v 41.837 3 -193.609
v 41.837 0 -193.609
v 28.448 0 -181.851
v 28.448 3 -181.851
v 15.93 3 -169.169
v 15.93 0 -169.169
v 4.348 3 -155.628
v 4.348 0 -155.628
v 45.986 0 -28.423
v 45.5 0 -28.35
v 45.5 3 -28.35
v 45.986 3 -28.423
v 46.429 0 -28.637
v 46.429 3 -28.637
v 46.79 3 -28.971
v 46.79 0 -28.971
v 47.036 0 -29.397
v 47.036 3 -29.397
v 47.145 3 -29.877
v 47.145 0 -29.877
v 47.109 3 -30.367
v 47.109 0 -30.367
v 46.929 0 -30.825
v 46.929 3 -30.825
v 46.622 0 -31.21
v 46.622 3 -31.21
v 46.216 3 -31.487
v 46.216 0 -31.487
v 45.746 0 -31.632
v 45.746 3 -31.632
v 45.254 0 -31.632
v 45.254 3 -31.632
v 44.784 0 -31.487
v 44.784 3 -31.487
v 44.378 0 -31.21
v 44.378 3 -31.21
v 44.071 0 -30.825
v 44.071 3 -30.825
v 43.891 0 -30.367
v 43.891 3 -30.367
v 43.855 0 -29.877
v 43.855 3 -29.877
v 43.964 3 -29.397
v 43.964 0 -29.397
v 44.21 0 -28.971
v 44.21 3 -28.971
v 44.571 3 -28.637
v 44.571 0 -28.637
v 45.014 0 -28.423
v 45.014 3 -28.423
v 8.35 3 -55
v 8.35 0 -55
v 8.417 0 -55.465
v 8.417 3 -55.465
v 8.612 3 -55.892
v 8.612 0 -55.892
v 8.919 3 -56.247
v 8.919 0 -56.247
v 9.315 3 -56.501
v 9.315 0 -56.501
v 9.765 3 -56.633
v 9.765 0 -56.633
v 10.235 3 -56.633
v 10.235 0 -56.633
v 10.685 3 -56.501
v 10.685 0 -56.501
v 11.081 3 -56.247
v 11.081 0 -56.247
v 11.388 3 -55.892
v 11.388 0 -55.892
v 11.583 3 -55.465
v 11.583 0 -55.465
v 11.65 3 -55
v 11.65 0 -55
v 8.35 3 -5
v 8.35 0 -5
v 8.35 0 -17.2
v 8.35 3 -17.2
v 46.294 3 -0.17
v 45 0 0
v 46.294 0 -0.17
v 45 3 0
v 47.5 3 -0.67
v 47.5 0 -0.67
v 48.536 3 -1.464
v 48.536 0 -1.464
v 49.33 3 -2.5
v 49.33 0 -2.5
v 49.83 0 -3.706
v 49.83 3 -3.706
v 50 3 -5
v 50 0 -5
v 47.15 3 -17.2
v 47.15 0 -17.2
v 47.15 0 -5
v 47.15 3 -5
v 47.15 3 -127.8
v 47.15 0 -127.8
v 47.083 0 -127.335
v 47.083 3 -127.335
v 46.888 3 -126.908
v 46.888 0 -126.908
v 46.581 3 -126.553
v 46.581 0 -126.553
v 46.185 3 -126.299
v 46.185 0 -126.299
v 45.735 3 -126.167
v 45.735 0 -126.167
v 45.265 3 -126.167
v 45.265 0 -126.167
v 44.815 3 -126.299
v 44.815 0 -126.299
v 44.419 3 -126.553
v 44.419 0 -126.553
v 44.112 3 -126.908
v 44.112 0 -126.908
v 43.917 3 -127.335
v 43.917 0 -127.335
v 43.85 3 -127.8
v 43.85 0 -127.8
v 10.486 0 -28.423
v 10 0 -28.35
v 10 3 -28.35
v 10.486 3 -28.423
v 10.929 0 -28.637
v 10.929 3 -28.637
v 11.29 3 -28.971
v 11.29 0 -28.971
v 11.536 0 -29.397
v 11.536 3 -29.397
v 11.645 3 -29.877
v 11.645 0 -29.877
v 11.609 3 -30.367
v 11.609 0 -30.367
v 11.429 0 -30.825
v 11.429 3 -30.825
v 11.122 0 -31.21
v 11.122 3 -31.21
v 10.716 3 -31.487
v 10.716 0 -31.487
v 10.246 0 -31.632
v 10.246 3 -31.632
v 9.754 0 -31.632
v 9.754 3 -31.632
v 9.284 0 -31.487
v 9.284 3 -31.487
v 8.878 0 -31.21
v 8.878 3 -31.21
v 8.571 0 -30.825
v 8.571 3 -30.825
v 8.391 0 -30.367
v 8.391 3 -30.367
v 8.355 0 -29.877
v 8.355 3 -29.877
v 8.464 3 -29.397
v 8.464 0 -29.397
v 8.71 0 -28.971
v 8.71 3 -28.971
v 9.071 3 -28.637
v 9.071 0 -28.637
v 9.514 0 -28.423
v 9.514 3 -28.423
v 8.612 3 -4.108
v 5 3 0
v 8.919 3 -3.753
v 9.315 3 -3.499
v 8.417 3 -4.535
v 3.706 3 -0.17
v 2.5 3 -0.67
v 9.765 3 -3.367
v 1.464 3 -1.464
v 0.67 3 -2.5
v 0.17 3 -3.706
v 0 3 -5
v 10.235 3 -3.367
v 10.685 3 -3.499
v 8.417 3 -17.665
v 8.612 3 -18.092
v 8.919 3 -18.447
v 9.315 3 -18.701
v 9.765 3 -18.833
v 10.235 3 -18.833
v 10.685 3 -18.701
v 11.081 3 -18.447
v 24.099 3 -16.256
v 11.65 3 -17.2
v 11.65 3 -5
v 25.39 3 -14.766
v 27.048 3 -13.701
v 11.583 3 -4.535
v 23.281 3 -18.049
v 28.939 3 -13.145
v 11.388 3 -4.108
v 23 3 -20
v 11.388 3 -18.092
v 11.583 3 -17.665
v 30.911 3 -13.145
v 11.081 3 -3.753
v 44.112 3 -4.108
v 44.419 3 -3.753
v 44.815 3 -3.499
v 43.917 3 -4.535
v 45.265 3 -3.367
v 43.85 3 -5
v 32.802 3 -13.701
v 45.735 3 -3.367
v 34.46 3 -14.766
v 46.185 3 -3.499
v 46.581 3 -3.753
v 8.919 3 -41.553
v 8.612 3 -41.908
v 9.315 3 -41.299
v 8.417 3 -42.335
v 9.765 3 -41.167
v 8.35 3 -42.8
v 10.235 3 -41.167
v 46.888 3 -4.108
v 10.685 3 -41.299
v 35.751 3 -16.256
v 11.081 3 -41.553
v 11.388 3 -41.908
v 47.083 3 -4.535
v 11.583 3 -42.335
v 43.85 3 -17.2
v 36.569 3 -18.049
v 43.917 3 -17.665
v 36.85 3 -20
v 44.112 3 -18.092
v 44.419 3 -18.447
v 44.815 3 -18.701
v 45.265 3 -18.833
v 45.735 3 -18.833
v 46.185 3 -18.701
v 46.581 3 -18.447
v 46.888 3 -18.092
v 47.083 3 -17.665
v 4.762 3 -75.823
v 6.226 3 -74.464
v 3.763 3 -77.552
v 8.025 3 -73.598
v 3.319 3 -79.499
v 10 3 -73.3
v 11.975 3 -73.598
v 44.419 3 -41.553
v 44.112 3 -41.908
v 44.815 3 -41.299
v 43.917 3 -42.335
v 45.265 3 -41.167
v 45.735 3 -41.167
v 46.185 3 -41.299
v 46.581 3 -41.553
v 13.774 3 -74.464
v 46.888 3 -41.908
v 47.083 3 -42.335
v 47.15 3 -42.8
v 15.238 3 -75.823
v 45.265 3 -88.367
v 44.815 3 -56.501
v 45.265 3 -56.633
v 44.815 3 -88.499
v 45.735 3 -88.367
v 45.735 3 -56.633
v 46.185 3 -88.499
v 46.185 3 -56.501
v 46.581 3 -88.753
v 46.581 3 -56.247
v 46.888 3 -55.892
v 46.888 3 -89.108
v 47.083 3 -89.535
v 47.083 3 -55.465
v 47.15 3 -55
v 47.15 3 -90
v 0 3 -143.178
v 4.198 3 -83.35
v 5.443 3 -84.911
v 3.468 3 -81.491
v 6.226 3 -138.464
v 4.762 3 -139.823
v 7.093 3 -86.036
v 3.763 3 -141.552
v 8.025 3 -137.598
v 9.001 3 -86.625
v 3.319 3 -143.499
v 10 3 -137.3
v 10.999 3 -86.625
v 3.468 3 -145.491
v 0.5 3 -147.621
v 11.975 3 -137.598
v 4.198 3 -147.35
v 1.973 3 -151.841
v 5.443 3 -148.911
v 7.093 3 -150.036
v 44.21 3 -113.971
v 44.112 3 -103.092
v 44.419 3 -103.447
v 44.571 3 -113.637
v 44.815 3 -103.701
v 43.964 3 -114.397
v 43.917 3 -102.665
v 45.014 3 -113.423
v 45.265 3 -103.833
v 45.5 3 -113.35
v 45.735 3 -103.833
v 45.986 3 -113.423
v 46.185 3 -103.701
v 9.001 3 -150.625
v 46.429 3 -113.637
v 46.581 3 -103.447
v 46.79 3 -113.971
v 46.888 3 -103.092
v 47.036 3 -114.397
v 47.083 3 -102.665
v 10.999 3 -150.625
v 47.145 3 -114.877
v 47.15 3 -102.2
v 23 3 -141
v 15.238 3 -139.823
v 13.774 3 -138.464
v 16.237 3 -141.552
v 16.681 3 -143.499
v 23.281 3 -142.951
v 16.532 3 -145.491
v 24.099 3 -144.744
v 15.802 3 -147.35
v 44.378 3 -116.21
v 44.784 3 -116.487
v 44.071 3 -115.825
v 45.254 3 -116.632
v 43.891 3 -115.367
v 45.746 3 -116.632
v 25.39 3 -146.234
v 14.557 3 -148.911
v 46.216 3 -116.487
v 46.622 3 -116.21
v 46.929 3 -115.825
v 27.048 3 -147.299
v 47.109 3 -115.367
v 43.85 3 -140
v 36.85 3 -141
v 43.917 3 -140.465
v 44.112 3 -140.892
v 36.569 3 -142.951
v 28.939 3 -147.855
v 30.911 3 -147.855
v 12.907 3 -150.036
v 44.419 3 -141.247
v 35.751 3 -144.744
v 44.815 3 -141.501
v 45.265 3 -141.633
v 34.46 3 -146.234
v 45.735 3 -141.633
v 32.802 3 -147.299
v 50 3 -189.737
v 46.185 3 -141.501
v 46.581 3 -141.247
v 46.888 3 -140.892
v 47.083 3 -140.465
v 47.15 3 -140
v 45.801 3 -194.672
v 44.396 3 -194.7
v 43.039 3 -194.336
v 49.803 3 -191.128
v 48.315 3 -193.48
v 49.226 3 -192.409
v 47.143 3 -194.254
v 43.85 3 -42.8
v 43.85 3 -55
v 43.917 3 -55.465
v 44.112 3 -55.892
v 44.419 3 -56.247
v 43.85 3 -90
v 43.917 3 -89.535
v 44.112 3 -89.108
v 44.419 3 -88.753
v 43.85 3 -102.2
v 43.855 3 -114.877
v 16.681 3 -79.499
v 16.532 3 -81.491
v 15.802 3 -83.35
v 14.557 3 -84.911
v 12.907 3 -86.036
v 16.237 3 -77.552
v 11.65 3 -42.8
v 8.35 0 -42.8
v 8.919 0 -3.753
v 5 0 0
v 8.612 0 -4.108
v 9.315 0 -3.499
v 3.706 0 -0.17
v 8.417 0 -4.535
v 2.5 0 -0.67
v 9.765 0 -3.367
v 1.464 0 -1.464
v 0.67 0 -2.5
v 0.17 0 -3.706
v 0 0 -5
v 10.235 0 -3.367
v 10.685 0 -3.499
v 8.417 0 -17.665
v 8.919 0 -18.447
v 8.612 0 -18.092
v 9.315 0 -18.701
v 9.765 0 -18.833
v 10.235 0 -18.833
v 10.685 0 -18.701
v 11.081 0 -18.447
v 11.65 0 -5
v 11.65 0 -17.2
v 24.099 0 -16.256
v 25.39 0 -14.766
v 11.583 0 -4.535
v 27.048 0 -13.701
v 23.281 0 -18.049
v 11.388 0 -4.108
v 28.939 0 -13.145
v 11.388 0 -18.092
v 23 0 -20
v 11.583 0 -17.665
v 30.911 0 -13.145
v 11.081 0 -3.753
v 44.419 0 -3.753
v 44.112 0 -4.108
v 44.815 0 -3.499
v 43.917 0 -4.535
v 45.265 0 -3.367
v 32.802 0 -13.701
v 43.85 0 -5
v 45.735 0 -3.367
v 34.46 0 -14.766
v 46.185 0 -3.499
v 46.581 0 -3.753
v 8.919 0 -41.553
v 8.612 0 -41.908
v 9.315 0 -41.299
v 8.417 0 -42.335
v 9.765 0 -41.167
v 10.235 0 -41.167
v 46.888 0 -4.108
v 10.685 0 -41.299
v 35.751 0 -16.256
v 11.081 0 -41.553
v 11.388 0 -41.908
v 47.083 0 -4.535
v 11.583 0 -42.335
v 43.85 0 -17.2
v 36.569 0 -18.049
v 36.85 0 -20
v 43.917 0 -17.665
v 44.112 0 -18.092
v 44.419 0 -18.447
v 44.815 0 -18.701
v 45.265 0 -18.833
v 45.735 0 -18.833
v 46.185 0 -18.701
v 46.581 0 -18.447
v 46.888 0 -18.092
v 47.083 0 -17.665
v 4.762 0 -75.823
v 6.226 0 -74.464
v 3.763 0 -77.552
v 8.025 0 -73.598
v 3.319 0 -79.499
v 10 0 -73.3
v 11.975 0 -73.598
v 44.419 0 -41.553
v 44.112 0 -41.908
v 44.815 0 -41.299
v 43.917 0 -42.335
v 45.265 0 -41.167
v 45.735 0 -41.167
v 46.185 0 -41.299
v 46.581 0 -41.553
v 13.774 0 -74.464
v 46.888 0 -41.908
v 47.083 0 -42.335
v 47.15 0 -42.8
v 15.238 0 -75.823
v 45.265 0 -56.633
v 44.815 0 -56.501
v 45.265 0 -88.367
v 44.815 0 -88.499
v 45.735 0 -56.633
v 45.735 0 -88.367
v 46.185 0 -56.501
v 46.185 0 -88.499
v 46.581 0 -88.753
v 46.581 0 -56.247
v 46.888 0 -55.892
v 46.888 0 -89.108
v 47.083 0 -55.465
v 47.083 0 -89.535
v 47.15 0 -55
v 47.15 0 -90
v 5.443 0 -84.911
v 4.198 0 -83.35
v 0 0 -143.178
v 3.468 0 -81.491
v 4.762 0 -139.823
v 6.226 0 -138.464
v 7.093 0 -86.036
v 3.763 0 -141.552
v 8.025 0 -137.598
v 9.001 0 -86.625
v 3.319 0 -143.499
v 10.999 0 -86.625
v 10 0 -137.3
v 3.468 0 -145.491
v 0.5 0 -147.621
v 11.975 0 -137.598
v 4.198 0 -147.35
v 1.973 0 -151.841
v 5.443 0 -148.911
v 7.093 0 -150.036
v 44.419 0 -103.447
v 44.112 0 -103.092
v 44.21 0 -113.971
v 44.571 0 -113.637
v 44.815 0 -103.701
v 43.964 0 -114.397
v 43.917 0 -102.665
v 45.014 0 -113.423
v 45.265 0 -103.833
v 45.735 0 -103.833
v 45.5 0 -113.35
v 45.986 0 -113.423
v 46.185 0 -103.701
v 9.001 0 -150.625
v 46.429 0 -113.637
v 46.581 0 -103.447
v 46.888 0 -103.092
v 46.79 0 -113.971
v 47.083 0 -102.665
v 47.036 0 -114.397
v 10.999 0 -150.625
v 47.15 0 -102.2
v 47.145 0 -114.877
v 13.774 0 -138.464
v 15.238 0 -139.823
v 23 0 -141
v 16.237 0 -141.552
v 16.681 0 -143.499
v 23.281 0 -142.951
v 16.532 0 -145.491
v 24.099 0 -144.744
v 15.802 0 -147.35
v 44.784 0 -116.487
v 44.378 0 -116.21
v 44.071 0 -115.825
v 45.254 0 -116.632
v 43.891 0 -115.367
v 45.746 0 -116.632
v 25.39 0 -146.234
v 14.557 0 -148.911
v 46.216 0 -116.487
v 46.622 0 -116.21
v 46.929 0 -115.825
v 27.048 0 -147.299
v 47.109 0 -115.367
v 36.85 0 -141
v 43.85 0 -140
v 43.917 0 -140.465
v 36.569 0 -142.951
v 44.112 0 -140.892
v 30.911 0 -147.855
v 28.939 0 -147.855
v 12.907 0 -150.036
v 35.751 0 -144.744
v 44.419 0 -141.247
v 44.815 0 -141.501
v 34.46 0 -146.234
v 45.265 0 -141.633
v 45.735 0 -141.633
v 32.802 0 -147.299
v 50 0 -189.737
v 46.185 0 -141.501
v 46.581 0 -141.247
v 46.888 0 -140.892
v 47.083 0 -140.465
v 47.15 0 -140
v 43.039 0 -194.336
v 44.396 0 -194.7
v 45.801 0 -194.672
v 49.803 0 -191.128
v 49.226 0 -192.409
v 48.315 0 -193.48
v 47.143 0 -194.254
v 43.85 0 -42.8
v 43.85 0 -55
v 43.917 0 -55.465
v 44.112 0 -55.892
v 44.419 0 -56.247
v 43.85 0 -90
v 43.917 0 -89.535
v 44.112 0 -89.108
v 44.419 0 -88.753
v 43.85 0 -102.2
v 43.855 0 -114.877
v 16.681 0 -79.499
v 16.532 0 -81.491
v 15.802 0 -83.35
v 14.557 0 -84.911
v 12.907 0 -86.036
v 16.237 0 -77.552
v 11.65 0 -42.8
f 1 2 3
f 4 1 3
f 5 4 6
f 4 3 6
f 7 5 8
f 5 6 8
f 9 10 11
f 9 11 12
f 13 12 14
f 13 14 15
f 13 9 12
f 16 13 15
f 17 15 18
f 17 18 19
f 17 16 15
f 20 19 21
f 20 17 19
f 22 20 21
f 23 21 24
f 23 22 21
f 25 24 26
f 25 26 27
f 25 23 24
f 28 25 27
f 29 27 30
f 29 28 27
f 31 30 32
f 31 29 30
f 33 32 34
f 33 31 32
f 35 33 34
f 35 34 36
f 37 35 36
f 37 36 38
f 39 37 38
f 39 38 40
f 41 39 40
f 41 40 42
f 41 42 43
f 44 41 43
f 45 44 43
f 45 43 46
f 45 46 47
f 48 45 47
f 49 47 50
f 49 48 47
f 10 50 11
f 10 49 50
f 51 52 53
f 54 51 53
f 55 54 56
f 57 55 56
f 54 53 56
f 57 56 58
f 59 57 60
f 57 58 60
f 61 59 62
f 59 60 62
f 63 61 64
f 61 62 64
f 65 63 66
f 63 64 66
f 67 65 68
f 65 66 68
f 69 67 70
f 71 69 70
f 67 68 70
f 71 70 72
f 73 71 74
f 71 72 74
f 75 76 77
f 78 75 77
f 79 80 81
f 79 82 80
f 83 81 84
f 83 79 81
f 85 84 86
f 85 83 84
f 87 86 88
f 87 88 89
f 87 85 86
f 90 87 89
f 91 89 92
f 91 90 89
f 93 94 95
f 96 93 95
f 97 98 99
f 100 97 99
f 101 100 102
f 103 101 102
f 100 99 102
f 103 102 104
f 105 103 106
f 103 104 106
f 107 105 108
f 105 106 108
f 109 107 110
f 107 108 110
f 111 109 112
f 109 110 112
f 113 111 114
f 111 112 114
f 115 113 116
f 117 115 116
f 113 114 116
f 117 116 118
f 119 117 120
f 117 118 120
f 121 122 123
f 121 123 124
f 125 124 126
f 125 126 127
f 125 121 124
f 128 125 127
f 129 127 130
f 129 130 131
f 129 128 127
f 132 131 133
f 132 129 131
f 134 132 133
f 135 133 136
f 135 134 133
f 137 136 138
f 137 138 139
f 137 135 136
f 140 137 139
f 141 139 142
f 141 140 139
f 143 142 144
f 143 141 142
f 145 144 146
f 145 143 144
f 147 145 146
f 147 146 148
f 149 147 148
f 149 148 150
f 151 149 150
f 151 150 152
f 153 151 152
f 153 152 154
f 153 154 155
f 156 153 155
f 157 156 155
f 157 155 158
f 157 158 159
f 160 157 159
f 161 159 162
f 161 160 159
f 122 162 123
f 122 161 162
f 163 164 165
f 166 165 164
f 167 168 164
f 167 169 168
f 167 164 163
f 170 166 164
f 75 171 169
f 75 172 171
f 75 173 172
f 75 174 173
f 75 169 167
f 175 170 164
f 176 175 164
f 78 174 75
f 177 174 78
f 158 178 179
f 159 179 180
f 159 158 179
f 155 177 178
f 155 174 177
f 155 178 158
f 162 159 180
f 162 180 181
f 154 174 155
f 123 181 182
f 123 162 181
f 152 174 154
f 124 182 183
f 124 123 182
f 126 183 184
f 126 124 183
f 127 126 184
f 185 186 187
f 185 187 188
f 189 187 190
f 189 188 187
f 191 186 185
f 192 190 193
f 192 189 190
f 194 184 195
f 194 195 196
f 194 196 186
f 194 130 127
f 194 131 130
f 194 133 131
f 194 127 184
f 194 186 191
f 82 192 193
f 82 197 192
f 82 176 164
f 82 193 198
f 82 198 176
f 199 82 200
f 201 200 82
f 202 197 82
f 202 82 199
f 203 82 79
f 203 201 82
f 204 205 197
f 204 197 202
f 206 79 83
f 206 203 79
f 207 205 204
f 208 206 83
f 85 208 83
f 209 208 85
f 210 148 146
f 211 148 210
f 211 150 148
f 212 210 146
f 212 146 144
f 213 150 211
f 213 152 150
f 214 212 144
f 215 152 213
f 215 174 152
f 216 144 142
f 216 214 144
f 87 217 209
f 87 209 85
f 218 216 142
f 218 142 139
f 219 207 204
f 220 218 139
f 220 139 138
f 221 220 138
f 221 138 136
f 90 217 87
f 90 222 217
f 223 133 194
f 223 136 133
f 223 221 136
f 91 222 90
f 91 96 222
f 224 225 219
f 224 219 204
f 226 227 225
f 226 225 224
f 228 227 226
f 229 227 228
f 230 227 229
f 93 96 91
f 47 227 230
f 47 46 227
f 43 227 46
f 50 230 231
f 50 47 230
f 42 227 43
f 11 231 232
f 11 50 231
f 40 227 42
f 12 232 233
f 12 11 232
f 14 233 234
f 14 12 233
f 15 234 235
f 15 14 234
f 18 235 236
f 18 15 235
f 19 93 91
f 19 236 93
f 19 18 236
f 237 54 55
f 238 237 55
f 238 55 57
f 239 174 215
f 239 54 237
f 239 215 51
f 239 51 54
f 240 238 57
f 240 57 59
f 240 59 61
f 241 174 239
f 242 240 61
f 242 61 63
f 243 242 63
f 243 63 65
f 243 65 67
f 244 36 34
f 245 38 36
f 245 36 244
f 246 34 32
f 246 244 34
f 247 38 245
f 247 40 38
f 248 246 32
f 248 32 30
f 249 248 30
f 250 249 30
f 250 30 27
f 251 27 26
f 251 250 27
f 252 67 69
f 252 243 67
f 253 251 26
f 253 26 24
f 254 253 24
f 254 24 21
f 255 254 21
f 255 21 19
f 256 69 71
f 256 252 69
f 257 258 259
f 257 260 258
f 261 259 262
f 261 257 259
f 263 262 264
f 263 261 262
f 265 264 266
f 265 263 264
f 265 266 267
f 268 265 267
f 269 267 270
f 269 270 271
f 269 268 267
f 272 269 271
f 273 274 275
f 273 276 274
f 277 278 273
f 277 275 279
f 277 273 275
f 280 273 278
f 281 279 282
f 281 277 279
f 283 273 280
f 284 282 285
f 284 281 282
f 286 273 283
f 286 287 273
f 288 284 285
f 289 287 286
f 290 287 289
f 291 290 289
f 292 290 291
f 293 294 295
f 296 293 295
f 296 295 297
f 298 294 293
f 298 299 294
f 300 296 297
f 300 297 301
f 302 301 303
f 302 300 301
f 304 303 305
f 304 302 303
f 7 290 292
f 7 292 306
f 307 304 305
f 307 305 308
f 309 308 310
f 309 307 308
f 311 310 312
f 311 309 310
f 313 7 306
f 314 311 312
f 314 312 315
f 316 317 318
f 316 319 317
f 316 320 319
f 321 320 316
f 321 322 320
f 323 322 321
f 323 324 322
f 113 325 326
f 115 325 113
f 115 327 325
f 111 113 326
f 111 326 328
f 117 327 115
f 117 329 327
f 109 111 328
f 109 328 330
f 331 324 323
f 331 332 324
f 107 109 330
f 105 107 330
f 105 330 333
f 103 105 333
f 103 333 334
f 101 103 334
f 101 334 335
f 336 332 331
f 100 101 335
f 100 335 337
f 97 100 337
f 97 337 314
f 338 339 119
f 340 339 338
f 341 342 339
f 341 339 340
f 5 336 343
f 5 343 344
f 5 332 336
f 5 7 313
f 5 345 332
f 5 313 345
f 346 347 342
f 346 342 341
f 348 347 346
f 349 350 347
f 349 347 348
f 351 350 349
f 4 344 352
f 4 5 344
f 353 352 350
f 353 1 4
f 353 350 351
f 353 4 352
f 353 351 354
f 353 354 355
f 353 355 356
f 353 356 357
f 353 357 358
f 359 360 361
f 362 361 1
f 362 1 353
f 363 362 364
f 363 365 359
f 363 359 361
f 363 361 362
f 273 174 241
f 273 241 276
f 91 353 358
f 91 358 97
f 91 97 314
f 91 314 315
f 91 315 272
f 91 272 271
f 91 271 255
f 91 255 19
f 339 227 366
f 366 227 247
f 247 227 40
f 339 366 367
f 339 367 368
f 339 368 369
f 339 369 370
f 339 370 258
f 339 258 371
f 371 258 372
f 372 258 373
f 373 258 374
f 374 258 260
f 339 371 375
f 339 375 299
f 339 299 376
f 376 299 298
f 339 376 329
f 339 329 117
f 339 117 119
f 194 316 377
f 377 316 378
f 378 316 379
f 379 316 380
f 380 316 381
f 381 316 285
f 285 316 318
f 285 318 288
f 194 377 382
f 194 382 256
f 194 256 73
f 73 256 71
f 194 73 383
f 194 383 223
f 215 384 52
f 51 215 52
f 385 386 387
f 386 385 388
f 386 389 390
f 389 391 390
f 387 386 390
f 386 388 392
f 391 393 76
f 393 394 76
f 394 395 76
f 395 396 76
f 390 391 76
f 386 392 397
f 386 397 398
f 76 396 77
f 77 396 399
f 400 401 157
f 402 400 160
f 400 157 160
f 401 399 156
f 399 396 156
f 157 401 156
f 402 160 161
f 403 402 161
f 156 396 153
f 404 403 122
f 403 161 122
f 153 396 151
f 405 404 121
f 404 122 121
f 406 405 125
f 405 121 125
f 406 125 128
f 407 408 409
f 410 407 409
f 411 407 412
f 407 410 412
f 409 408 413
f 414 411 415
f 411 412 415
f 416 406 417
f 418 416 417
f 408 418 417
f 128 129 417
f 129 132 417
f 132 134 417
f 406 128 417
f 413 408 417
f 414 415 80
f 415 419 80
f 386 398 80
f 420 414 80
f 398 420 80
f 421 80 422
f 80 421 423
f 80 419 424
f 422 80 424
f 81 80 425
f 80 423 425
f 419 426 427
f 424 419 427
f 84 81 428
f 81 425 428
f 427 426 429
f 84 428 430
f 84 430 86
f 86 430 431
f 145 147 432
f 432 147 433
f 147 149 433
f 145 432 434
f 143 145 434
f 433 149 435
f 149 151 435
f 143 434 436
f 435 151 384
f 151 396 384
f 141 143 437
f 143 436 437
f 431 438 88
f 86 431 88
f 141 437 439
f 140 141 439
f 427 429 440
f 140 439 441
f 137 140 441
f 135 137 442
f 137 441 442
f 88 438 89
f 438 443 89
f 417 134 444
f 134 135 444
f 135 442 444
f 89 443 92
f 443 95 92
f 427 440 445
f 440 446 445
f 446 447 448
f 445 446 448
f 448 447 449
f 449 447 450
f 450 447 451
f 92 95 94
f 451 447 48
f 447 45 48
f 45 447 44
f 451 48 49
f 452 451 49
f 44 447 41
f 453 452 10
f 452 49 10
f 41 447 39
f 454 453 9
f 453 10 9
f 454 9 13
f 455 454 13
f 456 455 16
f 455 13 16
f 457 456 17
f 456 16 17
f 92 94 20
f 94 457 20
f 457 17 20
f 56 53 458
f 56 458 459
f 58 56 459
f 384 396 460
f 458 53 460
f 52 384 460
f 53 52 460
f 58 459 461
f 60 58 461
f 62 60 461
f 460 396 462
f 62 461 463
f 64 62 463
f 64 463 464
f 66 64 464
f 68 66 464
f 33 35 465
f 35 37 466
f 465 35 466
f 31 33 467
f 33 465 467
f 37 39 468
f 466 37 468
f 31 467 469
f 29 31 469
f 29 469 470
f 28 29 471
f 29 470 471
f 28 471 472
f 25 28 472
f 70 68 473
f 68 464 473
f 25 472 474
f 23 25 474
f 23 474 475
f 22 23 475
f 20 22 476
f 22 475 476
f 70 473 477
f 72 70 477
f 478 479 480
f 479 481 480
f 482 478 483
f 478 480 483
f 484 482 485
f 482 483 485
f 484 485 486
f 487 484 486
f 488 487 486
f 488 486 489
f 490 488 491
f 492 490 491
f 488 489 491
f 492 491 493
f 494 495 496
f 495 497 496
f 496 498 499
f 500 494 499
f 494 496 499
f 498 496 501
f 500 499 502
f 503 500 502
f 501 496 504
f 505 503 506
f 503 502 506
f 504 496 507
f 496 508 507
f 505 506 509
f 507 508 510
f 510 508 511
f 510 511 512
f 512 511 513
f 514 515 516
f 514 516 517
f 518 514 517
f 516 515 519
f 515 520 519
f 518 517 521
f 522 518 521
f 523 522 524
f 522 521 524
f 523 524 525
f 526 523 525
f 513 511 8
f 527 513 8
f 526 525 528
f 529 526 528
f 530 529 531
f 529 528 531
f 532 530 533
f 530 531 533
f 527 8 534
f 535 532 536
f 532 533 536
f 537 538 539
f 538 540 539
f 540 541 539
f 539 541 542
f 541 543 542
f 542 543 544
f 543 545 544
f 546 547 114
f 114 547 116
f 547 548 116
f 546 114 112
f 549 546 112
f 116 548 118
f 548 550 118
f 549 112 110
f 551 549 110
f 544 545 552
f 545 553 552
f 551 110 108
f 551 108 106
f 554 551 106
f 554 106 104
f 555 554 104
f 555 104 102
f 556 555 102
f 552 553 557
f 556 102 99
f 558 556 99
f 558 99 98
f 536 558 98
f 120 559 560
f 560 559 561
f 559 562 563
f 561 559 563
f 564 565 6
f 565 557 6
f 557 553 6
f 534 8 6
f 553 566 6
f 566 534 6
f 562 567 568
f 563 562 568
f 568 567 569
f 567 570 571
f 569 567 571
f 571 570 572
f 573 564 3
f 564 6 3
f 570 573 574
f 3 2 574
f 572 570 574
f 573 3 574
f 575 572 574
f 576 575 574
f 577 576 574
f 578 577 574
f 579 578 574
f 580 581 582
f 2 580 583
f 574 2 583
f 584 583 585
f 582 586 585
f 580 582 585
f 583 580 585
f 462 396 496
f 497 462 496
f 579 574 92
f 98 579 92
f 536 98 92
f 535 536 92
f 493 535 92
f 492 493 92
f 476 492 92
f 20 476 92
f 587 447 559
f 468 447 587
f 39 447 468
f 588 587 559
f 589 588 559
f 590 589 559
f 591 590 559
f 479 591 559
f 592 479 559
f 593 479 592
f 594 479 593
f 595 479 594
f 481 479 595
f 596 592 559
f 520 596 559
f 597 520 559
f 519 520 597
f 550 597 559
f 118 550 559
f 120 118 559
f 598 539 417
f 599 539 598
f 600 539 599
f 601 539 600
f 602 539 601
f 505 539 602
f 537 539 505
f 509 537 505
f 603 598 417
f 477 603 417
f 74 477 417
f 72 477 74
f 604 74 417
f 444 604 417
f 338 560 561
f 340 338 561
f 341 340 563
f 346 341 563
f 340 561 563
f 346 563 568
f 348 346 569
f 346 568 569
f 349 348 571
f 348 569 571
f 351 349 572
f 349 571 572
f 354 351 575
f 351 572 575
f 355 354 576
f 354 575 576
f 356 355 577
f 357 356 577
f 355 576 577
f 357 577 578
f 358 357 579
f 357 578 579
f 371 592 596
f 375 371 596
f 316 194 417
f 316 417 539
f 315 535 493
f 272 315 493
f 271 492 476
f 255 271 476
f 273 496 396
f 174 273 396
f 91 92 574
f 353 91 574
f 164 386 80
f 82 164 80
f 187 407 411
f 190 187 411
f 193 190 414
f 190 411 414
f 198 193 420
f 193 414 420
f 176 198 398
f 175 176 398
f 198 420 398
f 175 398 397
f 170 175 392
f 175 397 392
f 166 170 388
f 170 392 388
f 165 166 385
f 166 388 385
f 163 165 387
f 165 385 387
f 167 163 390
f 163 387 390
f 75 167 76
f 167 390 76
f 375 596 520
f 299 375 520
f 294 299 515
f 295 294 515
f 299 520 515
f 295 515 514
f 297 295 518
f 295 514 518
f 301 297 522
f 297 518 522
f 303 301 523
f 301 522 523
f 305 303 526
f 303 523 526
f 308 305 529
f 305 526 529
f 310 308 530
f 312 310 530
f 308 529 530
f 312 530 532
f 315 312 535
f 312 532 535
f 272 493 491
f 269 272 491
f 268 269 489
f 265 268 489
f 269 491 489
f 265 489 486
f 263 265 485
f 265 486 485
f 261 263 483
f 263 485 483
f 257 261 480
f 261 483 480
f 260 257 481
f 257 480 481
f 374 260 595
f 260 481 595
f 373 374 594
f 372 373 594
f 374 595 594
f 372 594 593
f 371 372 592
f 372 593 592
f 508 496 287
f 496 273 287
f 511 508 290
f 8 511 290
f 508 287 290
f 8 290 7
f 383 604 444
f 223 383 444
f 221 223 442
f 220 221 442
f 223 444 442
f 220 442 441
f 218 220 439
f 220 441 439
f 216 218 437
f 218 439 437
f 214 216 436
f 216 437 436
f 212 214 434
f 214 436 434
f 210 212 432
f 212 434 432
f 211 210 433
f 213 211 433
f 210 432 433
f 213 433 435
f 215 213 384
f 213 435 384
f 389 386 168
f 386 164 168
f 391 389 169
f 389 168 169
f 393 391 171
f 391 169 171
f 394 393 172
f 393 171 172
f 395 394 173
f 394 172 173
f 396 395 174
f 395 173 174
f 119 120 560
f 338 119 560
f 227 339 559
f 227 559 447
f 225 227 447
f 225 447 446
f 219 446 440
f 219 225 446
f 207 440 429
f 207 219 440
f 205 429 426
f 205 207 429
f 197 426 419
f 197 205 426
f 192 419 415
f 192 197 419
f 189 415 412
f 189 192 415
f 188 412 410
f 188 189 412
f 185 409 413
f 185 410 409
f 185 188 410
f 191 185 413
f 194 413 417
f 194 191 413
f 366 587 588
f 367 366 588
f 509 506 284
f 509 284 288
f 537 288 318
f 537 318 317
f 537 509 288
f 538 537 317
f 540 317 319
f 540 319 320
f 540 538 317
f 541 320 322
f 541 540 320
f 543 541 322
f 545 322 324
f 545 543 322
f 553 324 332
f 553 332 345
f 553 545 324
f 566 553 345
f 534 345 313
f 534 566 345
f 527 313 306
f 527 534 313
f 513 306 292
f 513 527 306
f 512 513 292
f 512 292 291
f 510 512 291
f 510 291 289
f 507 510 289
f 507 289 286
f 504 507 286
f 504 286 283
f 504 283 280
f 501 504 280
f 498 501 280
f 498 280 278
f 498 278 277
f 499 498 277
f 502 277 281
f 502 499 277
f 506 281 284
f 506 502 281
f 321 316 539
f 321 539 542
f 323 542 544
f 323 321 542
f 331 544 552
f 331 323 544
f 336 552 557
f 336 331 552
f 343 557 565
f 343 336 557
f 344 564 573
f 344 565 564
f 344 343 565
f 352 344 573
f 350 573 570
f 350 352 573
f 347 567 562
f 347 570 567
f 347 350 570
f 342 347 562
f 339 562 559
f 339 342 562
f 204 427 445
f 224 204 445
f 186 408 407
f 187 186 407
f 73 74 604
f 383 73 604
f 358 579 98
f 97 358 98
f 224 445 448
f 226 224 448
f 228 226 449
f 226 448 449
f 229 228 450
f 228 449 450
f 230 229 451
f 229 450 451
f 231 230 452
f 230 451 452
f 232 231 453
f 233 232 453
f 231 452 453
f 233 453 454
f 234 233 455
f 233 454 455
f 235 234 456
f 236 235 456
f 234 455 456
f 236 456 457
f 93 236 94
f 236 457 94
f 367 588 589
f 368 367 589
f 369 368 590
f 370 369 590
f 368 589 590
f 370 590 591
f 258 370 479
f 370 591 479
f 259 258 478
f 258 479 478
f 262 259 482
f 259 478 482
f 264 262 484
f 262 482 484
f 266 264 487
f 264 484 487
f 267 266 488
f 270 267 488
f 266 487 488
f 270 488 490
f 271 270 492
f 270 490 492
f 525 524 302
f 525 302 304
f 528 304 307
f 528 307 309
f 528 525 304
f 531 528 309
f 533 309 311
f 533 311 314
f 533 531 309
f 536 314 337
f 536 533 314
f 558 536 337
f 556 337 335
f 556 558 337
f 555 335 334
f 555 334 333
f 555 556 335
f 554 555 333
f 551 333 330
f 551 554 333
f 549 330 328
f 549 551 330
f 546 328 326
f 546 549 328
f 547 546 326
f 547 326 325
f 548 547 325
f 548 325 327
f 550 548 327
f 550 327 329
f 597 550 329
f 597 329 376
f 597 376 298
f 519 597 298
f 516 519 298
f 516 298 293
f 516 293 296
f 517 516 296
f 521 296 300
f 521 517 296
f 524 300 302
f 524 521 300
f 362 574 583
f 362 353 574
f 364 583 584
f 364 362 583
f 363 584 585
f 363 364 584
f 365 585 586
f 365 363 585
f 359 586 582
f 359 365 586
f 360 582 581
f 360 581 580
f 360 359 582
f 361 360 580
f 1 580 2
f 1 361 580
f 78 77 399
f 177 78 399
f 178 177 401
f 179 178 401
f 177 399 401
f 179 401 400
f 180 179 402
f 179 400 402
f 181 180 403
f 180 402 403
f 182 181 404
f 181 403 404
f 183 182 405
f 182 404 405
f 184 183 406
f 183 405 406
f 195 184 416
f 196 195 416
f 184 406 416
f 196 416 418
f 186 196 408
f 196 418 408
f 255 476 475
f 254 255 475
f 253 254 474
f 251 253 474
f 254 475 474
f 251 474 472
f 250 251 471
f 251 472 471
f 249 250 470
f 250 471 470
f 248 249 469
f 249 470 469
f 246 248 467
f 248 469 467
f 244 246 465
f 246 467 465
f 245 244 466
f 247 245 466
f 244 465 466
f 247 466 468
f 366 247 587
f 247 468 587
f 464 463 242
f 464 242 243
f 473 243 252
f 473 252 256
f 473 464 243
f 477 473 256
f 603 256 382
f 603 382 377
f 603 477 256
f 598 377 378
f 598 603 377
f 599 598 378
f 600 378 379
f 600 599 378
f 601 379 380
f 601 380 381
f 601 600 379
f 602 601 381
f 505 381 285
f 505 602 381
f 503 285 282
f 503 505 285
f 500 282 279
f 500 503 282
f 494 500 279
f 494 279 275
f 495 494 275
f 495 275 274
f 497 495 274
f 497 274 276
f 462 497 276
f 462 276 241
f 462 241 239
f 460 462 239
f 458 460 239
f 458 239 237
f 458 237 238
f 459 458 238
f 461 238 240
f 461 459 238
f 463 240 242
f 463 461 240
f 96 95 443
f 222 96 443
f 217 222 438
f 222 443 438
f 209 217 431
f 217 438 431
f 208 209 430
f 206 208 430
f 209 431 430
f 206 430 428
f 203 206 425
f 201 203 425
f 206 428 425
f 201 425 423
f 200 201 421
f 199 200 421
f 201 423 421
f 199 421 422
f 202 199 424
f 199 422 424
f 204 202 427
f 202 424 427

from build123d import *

# Parameters (mm, degrees)
SKETCH_1_R          = 6.7
SKETCH_1_R_2        = 1.650002274
SKETCH_1_R_3        = 1.65
EXTRUDE_1_DEPTH     = 3
FILLET_1_R          = 5
FILLET_2_R          = 20
CUT_EXTRUDE_1_DEPTH = 202.075524607


with BuildPart() as part:
    # 草图1 → 凸台-拉伸1 (new body)
    with BuildSketch(Plane(origin=(0, 0, 0), x_dir=(1, 0, 0), z_dir=(0, 1, 0))):
        with BuildLine():
            Line((0, 0), (50, 0))
            Line((50, 0), (50, 200))
            ThreePointArc((50, 200), (23.223304703, 176.776695297), (0, 150))
            Line((0, 150), (0, 0))
        make_face()
        with Locations(Location((10, 80, 0), (0, 0, 270))):
            Circle(SKETCH_1_R, mode=Mode.SUBTRACT)
        with Locations(Location((10, 144, 0), (0, 0, 270))):
            Circle(SKETCH_1_R, mode=Mode.SUBTRACT)
        with Locations(Location((10, 30, 0), (0, 0, 270))):
            Circle(SKETCH_1_R_2, mode=Mode.SUBTRACT)
        with Locations(Location((45.5, 30, 0), (0, 0, 270))):
            Circle(SKETCH_1_R_3, mode=Mode.SUBTRACT)
        with Locations(Location((45.5, 115, 0), (0, 0, 270))):
            Circle(SKETCH_1_R_3, mode=Mode.SUBTRACT)
        with BuildLine():
            Line((8.35, 5), (8.35, 17.2))
            ThreePointArc((8.35, 17.2), (10, 18.85), (11.65, 17.2))
            Line((11.65, 17.2), (11.65, 5))
            ThreePointArc((11.65, 5), (10, 3.35), (8.35, 5))
        make_face(mode=Mode.SUBTRACT)
        with BuildLine():
            Line((8.35, 42.8), (8.35, 55))
            ThreePointArc((8.35, 55), (10, 56.65), (11.65, 55))
            Line((11.65, 55), (11.65, 42.8))
            ThreePointArc((11.65, 42.8), (10, 41.15), (8.35, 42.8))
        make_face(mode=Mode.SUBTRACT)
        with BuildLine():
            Line((43.85, 5), (43.85, 17.2))
            ThreePointArc((43.85, 17.2), (45.5, 18.85), (47.15, 17.2))
            Line((47.15, 17.2), (47.15, 5))
            ThreePointArc((47.15, 5), (45.5, 3.35), (43.85, 5))
        make_face(mode=Mode.SUBTRACT)
        with BuildLine():
            Line((43.85, 42.8), (43.85, 55))
            ThreePointArc((43.85, 55), (45.5, 56.65), (47.15, 55))
            Line((47.15, 55), (47.15, 42.8))
            ThreePointArc((47.15, 42.8), (45.5, 41.15), (43.85, 42.8))
        make_face(mode=Mode.SUBTRACT)
        with BuildLine():
            Line((43.85, 90), (43.85, 102.2))
            ThreePointArc((43.85, 102.2), (45.5, 103.85), (47.15, 102.2))
            Line((47.15, 102.2), (47.15, 90))
            ThreePointArc((47.15, 90), (45.5, 88.35), (43.85, 90))
        make_face(mode=Mode.SUBTRACT)
        with BuildLine():
            Line((43.85, 127.8), (43.85, 140))
            ThreePointArc((43.85, 140), (45.5, 141.65), (47.15, 140))
            Line((47.15, 140), (47.15, 127.8))
            ThreePointArc((47.15, 127.8), (45.5, 126.15), (43.85, 127.8))
        make_face(mode=Mode.SUBTRACT)
    extrude(amount=EXTRUDE_1_DEPTH)

    # 圆角1
    fillet_1_edges = [part.edges().sort_by_distance(p)[0] for p in [
        (50, 1.5, -200),
        (50, 1.5, 0),
        (0, 1.5, 0),
    ]]
    fillet(fillet_1_edges, radius=FILLET_1_R)

    # 圆角2
    fillet_2_edges = [part.edges().sort_by_distance(p)[0] for p in [
        (0, 1.5, -150),
    ]]
    fillet(fillet_2_edges, radius=FILLET_2_R)

    # 草图2 → 切除-拉伸1 (cut, through all)
    with BuildSketch(Plane(origin=(0, 3, 0), x_dir=(1, 0, 0), z_dir=(0, 1, 0))):
        with BuildLine():
            Line((36.85, 141), (36.85, 20))
            ThreePointArc((36.85, 20), (29.925, 13.075), (23, 20))
            Line((23, 20), (23, 141))
            ThreePointArc((23, 141), (29.925, 147.925), (36.85, 141))
        make_face()
    extrude(amount=-CUT_EXTRUDE_1_DEPTH, mode=Mode.SUBTRACT)


solid = part.part
